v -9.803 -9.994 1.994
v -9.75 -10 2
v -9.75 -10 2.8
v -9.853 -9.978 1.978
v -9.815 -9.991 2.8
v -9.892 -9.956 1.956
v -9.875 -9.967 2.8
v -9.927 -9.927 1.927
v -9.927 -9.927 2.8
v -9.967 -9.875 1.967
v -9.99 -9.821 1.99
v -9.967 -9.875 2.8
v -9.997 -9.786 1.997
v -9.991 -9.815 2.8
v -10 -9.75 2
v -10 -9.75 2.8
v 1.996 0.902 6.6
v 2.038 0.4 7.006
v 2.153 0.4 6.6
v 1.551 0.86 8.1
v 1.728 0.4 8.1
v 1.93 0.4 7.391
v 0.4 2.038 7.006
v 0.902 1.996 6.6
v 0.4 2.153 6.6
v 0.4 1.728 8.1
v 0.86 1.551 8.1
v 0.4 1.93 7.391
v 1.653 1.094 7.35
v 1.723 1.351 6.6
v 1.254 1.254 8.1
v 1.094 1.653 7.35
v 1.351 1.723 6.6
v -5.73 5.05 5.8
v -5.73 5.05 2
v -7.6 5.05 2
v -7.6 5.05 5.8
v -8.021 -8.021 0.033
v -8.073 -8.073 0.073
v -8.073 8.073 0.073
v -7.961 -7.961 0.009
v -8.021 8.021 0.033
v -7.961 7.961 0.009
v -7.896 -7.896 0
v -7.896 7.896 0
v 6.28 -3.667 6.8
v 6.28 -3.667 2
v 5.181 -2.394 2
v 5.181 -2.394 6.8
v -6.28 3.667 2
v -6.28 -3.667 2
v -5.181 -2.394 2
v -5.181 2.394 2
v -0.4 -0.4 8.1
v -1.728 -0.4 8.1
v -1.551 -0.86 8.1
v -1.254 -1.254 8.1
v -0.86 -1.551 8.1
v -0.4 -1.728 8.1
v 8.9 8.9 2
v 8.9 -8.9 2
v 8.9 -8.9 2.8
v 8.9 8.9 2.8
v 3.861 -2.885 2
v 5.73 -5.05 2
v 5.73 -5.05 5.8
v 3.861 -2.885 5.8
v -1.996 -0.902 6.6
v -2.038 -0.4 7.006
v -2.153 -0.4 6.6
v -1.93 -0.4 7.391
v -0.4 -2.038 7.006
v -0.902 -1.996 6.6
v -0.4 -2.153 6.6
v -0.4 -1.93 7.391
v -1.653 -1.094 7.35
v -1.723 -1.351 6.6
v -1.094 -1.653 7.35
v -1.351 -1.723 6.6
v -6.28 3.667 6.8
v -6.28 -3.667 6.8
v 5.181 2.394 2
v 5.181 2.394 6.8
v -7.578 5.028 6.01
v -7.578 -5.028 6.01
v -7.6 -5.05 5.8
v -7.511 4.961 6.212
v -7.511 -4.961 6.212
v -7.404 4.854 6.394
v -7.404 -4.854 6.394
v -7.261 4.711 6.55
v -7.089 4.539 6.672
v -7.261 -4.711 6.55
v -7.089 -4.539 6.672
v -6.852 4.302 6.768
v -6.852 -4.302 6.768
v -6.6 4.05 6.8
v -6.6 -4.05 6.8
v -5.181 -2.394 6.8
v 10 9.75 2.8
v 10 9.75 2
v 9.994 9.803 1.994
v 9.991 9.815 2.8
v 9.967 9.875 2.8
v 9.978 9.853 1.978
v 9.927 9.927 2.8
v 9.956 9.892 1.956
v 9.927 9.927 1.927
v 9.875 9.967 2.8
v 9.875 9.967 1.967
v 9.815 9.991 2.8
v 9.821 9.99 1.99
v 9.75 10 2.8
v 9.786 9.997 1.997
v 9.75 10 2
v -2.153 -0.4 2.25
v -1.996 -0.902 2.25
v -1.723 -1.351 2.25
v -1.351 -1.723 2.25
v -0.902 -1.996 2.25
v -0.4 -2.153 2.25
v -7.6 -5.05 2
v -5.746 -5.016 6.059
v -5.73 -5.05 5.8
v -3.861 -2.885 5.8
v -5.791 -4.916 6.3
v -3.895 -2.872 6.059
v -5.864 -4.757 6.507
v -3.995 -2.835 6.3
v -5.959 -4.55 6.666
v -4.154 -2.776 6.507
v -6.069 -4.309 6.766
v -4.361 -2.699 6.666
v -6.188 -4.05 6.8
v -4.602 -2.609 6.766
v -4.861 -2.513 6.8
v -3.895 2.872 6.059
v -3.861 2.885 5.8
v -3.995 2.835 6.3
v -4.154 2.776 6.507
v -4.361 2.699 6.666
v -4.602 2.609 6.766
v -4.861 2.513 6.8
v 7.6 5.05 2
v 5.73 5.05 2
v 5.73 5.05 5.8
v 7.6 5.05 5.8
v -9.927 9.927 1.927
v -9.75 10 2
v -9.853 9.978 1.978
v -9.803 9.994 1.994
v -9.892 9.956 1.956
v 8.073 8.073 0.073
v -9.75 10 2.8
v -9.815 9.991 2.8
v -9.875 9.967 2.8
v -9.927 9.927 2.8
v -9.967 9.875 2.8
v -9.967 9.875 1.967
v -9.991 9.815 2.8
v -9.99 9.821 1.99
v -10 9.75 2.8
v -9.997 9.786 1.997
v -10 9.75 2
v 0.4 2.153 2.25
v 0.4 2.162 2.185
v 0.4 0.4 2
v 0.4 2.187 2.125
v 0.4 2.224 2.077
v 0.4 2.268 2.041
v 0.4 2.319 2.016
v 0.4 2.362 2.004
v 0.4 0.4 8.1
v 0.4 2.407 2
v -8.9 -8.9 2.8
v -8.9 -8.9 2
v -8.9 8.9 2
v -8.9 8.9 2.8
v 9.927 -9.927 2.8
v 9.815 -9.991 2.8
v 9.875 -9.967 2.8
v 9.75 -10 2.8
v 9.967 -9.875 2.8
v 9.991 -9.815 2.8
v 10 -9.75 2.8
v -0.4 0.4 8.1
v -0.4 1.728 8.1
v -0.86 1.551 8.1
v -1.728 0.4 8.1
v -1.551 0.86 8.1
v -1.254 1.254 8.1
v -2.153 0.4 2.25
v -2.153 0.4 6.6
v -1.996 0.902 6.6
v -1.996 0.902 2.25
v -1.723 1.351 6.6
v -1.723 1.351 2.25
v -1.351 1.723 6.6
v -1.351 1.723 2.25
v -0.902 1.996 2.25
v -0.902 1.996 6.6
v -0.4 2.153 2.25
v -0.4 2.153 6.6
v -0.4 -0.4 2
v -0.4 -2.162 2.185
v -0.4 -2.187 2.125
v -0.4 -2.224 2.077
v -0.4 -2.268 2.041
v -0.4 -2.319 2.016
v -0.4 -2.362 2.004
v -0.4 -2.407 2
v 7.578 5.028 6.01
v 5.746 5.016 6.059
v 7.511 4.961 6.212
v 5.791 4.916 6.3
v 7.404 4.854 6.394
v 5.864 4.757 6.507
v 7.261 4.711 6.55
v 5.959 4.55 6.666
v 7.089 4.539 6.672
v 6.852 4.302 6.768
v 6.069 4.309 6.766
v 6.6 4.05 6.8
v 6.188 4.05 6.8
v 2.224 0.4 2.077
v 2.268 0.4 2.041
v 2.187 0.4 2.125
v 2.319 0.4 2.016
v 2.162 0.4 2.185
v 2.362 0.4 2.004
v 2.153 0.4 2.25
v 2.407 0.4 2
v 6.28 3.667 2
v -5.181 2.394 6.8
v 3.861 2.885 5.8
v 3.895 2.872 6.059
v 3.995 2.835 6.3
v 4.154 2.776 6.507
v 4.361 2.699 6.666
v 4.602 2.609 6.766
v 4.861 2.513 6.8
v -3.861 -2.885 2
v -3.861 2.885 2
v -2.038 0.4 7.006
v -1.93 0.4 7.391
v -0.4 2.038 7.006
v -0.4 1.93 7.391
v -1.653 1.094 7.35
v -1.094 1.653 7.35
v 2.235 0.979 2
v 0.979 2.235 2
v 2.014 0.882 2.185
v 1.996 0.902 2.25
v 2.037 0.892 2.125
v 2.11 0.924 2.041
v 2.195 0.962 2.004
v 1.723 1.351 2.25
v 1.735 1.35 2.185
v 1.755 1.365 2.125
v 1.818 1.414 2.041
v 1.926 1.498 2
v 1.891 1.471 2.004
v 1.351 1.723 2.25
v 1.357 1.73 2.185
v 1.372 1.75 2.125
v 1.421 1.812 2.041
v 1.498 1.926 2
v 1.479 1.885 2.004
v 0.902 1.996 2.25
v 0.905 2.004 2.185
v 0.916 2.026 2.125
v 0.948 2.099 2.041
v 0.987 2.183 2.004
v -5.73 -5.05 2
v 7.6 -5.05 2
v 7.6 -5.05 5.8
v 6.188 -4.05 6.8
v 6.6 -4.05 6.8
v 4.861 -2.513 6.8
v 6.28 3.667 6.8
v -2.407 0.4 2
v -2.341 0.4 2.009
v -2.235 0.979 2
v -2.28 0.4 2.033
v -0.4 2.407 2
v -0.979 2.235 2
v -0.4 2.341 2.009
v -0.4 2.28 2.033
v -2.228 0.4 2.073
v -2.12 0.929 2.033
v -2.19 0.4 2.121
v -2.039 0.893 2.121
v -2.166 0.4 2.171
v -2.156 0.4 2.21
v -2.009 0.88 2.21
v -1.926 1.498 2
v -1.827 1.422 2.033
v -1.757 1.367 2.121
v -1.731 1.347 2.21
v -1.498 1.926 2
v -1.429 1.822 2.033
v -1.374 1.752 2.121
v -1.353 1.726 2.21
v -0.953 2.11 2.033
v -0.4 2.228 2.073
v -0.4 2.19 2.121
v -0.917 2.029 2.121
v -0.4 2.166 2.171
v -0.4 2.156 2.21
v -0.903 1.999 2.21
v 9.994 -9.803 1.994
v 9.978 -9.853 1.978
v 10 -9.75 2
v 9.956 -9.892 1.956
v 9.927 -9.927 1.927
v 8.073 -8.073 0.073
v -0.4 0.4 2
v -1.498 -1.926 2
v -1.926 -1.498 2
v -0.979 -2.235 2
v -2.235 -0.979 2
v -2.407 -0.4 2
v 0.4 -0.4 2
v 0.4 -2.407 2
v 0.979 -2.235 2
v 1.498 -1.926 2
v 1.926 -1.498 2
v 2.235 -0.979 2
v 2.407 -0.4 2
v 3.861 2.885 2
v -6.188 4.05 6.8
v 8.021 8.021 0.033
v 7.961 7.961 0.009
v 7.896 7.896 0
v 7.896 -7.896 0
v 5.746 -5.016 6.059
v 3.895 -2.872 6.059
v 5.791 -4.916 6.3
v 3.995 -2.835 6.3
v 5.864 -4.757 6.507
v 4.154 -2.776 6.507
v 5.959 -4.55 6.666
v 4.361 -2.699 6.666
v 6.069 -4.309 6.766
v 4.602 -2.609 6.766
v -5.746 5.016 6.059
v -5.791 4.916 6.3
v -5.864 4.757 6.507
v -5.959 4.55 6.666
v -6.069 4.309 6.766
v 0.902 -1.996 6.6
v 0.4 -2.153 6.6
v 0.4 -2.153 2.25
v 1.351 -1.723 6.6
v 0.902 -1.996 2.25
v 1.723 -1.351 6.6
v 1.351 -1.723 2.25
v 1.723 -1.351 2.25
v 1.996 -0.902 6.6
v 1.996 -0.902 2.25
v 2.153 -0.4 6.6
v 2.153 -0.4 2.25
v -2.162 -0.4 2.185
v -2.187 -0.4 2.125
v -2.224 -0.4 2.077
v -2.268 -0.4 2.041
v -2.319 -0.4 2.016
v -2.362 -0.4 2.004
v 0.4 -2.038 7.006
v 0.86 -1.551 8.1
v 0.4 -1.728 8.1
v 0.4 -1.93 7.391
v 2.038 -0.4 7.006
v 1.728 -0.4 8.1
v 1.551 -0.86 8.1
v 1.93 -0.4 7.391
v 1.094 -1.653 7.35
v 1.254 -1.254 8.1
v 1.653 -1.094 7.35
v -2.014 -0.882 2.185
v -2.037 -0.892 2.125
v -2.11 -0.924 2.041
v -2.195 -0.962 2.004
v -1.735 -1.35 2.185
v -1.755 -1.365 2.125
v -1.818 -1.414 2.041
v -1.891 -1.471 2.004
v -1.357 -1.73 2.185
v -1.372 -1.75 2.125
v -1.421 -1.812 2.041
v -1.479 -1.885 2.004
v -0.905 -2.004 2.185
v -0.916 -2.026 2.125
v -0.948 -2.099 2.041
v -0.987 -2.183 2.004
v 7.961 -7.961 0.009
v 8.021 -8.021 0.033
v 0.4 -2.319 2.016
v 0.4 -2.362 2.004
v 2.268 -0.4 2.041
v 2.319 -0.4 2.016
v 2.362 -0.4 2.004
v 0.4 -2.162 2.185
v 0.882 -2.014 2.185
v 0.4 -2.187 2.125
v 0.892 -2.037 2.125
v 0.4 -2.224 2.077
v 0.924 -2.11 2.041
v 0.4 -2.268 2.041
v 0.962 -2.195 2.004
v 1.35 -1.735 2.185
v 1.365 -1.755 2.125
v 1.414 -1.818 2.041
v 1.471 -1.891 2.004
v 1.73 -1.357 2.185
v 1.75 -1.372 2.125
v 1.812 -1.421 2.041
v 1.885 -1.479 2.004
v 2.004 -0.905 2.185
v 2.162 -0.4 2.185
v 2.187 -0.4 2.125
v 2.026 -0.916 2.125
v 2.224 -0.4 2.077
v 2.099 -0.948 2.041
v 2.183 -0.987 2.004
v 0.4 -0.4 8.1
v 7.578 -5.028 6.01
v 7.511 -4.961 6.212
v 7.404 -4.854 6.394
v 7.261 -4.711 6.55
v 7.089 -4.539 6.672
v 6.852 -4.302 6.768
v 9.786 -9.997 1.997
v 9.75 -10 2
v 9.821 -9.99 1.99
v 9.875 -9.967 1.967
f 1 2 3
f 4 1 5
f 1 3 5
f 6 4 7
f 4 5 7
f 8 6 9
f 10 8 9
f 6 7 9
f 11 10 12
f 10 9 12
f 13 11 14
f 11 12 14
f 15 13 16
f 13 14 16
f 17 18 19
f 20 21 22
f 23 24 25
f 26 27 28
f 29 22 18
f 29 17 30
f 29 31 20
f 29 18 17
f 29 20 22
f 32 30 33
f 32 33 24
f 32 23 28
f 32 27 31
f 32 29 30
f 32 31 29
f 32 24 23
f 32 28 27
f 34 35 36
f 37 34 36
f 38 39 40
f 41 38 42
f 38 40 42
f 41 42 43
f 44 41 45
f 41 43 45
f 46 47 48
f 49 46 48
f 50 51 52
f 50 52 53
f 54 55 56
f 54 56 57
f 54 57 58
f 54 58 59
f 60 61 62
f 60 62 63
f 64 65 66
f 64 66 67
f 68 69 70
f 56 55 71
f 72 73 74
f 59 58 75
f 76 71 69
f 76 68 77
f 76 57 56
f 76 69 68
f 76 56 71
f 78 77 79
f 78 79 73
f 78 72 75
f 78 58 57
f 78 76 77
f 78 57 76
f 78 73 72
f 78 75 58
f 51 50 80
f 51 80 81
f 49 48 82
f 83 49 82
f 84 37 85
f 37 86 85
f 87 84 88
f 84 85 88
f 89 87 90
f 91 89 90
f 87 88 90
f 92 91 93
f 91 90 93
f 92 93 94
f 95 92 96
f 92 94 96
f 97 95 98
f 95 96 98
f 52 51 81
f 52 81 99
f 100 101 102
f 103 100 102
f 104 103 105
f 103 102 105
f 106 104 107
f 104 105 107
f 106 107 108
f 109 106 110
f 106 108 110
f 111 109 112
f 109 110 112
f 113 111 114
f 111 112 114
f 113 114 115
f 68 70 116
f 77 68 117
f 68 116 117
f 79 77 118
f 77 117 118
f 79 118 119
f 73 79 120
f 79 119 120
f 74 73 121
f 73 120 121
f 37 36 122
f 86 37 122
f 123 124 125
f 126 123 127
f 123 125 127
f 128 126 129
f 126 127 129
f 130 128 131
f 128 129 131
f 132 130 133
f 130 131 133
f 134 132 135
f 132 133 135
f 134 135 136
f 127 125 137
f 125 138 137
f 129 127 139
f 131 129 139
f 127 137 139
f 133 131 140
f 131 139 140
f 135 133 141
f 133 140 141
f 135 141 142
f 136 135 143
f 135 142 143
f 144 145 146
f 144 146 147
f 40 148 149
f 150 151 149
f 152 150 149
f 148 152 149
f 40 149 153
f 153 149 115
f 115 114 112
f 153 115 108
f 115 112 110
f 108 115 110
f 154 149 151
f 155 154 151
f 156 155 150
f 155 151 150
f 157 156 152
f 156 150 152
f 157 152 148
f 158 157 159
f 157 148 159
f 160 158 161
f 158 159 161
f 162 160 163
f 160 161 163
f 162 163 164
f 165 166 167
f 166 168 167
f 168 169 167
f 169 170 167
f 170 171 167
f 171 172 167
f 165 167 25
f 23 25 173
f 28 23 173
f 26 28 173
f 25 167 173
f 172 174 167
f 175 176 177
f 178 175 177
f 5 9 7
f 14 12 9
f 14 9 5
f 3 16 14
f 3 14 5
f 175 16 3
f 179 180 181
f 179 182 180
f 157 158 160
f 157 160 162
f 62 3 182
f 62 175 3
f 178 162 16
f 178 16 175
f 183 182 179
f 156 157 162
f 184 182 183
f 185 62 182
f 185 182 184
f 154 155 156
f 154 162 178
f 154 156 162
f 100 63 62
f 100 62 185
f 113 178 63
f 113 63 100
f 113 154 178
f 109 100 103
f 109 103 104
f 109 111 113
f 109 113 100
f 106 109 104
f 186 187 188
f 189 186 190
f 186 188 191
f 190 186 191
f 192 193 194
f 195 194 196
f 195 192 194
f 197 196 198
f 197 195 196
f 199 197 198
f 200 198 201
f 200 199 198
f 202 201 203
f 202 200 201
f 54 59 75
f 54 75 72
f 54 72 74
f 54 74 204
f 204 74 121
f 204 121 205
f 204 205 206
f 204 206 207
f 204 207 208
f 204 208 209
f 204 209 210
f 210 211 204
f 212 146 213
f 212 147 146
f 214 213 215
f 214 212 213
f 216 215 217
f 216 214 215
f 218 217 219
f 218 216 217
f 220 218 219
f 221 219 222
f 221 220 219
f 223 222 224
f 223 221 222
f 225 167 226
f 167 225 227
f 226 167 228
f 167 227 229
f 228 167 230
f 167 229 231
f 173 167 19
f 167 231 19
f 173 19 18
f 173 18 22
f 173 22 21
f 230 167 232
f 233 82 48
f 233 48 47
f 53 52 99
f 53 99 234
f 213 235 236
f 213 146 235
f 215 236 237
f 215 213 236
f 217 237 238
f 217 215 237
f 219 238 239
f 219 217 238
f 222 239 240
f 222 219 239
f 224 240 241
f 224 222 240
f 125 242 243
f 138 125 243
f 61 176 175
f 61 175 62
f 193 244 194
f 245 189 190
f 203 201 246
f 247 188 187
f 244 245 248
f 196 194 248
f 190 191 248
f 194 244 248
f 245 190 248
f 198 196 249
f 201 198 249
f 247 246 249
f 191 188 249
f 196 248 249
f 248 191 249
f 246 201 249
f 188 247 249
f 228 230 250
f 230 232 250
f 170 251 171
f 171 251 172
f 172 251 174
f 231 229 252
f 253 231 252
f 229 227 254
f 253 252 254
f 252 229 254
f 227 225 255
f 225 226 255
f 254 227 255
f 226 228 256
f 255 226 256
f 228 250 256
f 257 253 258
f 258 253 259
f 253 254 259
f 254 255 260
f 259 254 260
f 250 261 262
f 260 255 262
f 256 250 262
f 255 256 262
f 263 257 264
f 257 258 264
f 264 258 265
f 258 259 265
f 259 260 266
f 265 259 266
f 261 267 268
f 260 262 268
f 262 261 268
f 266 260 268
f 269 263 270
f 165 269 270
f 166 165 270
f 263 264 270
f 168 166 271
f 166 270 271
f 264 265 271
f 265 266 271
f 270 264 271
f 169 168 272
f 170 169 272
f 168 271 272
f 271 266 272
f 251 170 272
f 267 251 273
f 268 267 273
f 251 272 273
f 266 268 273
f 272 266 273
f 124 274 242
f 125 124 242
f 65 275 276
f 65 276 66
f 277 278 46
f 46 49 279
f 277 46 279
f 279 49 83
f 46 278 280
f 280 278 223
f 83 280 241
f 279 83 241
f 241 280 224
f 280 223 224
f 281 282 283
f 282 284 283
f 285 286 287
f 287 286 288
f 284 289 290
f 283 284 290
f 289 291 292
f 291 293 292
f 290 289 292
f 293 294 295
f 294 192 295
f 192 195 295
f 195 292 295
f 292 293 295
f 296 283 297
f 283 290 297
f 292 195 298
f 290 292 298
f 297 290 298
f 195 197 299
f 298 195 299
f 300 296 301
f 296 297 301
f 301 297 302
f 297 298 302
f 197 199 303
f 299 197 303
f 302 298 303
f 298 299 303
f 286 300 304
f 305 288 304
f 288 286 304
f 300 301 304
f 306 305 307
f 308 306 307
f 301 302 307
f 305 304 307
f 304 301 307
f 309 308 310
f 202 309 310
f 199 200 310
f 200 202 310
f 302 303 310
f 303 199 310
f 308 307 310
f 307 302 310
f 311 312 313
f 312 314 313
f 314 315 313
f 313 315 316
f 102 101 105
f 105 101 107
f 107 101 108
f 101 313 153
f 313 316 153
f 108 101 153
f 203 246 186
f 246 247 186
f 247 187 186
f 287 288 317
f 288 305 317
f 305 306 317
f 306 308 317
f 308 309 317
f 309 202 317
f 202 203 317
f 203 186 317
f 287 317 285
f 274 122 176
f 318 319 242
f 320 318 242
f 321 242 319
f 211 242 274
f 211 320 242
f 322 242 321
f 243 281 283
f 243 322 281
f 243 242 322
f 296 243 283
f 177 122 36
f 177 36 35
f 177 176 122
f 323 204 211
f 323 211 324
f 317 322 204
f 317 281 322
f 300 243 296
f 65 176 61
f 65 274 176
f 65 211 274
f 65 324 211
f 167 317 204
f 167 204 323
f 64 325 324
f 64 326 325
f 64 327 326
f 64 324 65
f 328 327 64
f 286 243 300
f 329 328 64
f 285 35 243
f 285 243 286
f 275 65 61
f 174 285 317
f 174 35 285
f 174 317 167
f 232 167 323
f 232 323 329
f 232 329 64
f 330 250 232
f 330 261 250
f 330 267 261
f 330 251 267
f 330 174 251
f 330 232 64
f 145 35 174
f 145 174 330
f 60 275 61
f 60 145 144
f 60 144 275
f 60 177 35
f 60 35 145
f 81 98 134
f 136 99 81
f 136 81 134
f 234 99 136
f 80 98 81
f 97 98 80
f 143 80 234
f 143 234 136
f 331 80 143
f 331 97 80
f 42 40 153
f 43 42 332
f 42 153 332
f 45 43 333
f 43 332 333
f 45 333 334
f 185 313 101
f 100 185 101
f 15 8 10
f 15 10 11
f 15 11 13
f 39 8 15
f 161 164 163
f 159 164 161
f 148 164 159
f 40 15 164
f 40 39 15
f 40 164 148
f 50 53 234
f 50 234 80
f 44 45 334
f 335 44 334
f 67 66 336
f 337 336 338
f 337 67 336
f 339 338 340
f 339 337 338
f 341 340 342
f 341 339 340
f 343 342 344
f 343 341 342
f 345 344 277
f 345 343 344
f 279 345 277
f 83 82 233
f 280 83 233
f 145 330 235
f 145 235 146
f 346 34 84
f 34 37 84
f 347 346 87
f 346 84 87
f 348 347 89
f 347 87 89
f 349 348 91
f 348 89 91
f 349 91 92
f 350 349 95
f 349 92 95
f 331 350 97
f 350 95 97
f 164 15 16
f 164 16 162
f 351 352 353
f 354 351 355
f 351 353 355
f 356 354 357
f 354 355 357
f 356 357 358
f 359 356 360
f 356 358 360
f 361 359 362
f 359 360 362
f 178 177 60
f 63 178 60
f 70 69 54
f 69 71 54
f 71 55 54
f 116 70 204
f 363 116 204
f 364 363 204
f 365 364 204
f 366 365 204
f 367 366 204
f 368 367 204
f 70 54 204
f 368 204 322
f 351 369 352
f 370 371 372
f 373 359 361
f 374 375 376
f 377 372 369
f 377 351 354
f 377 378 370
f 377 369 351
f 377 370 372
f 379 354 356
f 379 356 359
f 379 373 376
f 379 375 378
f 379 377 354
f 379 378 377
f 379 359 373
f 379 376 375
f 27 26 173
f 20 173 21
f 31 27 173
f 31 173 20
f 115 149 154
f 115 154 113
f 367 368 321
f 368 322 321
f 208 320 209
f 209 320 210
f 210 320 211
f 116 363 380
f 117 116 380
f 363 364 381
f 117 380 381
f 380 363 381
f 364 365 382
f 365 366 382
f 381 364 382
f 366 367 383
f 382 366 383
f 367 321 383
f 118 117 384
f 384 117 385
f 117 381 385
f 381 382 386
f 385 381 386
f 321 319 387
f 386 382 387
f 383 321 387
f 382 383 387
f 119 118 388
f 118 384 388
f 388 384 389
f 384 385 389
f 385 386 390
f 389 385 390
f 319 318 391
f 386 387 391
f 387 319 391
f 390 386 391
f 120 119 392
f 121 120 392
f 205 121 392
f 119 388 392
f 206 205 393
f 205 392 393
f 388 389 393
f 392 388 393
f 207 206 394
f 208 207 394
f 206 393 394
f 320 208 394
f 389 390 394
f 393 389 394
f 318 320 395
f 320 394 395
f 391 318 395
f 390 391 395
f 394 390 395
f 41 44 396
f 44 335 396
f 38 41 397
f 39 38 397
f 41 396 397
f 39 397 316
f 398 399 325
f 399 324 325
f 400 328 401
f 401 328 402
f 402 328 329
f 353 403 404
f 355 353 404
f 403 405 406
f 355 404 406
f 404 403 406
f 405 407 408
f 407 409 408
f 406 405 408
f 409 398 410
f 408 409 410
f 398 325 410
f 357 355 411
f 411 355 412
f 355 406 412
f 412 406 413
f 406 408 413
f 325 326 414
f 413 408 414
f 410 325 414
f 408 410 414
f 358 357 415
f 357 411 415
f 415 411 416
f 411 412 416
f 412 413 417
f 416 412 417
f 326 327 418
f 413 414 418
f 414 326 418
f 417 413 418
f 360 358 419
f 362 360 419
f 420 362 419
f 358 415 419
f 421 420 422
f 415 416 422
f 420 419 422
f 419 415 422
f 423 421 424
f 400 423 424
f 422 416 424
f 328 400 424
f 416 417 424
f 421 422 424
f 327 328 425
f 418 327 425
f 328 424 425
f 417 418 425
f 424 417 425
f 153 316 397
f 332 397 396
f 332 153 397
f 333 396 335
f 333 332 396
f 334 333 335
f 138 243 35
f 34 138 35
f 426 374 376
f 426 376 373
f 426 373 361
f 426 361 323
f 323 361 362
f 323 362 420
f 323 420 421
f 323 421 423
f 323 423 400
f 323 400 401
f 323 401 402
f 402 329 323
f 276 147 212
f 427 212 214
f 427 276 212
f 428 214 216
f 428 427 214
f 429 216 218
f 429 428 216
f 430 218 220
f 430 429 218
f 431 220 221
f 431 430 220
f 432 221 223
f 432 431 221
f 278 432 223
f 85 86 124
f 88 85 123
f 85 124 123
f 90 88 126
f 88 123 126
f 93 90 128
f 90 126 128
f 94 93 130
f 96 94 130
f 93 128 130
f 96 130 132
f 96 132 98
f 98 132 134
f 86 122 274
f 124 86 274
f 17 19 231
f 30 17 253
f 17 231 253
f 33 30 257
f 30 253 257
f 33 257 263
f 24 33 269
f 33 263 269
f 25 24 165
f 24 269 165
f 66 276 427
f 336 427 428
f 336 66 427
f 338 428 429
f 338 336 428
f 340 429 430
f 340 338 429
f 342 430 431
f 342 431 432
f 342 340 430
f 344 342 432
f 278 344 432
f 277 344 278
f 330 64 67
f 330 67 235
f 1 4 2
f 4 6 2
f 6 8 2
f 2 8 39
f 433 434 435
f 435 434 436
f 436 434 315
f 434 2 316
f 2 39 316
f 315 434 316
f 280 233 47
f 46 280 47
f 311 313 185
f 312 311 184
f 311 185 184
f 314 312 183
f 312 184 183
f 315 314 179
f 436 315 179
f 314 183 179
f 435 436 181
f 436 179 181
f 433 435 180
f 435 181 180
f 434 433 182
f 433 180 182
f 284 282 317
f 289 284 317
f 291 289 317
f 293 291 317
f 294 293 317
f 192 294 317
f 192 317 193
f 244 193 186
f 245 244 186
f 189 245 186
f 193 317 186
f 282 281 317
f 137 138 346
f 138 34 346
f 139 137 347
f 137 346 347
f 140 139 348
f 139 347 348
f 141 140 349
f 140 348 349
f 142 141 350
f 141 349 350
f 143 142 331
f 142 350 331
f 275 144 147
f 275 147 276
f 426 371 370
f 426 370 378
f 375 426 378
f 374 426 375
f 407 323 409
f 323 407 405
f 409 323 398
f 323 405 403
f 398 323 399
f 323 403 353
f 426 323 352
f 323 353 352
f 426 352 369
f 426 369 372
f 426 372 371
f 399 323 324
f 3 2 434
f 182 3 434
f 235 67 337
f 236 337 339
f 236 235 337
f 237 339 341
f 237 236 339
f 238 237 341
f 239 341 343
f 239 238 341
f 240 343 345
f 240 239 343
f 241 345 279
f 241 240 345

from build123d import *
from OCP.BRepFilletAPI import BRepFilletAPI_MakeChamfer

# Parameters (mm, degrees)
SKETCH3_W           = 20
SKETCH3_H           = 20
BOSS_EXTRUDE1_DEPTH = 2
SKETCH4_W           = 20
SKETCH4_H           = 20
SKETCH4_W_2         = 17.8
SKETCH4_H_2         = 17.8
BOSS_EXTRUDE2_DEPTH = 0.8
CHAMFER1_SIZE       = 2
BOSS_EXTRUDE3_DEPTH = 4.8
FILLET2_R           = 1
FILLET4_R           = 1
BOSS_EXTRUDE4_DEPTH = 6.1
CHAMFER2_SIZE       = 1.5
CHAMFER2_SIZE2      = 0.415986816
FILLET5_R           = 0.25
FILLET6_R           = 0.25


with BuildPart() as part:
    # Sketch3 → Boss-Extrude1 (new body)
    with BuildSketch(Plane.XY):
        Rectangle(SKETCH3_W, SKETCH3_H)
    extrude(amount=BOSS_EXTRUDE1_DEPTH)

    # Sketch4 → Boss-Extrude2 (add)
    with BuildSketch(Plane.XY.offset(2)):
        Rectangle(SKETCH4_W, SKETCH4_H)
        Rectangle(SKETCH4_W_2, SKETCH4_H_2, mode=Mode.SUBTRACT)
    extrude(amount=BOSS_EXTRUDE2_DEPTH)

    # Chamfer1
    chamfer1_edges = [part.edges().sort_by_distance(p)[0] for p in [
        (0, 10, 0),
        (10, 0, 0),
        (0, -10, 0),
        (-10, 0, 0),
    ]]
    chamfer(chamfer1_edges, length=CHAMFER1_SIZE)

    # Sketch7 → Boss-Extrude3 (add)
    with BuildSketch(Plane.XY.offset(2)):
        Polygon((-7.6, 5.05), (-7.6, -5.05), (-5.73, -5.05), (-3.861210285, -2.885), (-3.861210285, 2.885), (-5.73, 5.05), align=None)
        Polygon((-5.181210285, -2.394094045), (-5.181210285, 2.394094045), (-6.28, 3.667046113), (-6.28, -3.667046113), align=None, mode=Mode.SUBTRACT)
    boss_extrude3 = extrude(amount=BOSS_EXTRUDE3_DEPTH)

    # Mirror1: Boss-Extrude3 across plane
    add(boss_extrude3.mirror(Plane(origin=(0, 0, 0), x_dir=(0, 0, 1), z_dir=(1, 0, 0))))

    # Fillet2
    fillet2_edges = [part.edges().sort_by_distance(p)[0] for p in [
        (-6.665, 5.05, 6.8),
        (-7.6, 0, 6.8),
        (-6.665, -5.05, 6.8),
        (-4.795605142, -3.9675, 6.8),
        (-3.861210285, 0, 6.8),
        (-4.795605142, 3.9675, 6.8),
    ]]
    fillet(fillet2_edges, radius=FILLET2_R)

    # Fillet4
    fillet4_edges = [part.edges().sort_by_distance(p)[0] for p in [
        (6.665, 5.05, 6.8),
        (4.795605142, 3.9675, 6.8),
        (3.861210285, 0, 6.8),
        (4.795605142, -3.9675, 6.8),
        (6.665, -5.05, 6.8),
        (7.6, 0, 6.8),
    ]]
    fillet(fillet4_edges, radius=FILLET4_R)

    # Sketch8 → Boss-Extrude4 (add)
    with BuildSketch(Plane.XY.offset(2)):
        with BuildLine():
            Line((-0.4, 2.153160468), (-0.4, 0.4))
            Line((-0.4, 0.4), (-2.153160468, 0.4))
            ThreePointArc((-2.153160468, 0.4), (-1.548563851, 1.548563851), (-0.4, 2.153160468))
        make_face()
        with BuildLine():
            Line((0.4, 2.153160468), (0.4, 0.4))
            Line((0.4, 0.4), (2.153160468, 0.4))
            ThreePointArc((2.153160468, 0.4), (1.548563851, 1.548563851), (0.4, 2.153160468))
        make_face()
        with BuildLine():
            Line((2.153160468, -0.4), (0.4, -0.4))
            Line((0.4, -0.4), (0.4, -2.153160468))
            ThreePointArc((0.4, -2.153160468), (1.548563851, -1.548563851), (2.153160468, -0.4))
        make_face()
        with BuildLine():
            Line((-0.4, -0.4), (-2.153160468, -0.4))
            ThreePointArc((-2.153160468, -0.4), (-1.548563851, -1.548563851), (-0.4, -2.153160468))
            Line((-0.4, -2.153160468), (-0.4, -0.4))
        make_face()
    extrude(amount=BOSS_EXTRUDE4_DEPTH)

    # Chamfer2: one chamfer whose edges measure the first distance from different faces: ONE call of the kernel's chamfer builder (chamfer() names one face for all edges)
    chamfer2_edges_1 = [part.edges().sort_by_distance(p)[0] for p in [
        (1.548563851, 1.548563851, 8.1),
    ]]
    chamfer2_side_1 = [part.faces().sort_by_distance(p)[0] for p in [
        (1.548563851, 1.548563851, 5.05),
    ]]
    chamfer2_edges_2 = [part.edges().sort_by_distance(p)[0] for p in [
        (-1.548563851, 1.548563851, 8.1),
    ]]
    chamfer2_side_2 = [part.faces().sort_by_distance(p)[0] for p in [
        (-1.548563851, 1.548563851, 5.05),
    ]]
    chamfer2_edges_3 = [part.edges().sort_by_distance(p)[0] for p in [
        (1.548563851, -1.548563851, 8.1),
    ]]
    chamfer2_side_3 = [part.faces().sort_by_distance(p)[0] for p in [
        (1.548563851, -1.548563851, 5.05),
    ]]
    chamfer2_edges_4 = [part.edges().sort_by_distance(p)[0] for p in [
        (-1.548563851, -1.548563851, 8.1),
    ]]
    chamfer2_side_4 = [part.faces().sort_by_distance(p)[0] for p in [
        (-1.548563851, -1.548563851, 5.05),
    ]]
    chamfer2 = BRepFilletAPI_MakeChamfer(part.part.solid().wrapped)
    for e in chamfer2_edges_1:
        chamfer2.Add(CHAMFER2_SIZE, CHAMFER2_SIZE2, e.wrapped, chamfer2_side_1[0].wrapped)  # the first distance lies on this face
    for e in chamfer2_edges_2:
        chamfer2.Add(CHAMFER2_SIZE, CHAMFER2_SIZE2, e.wrapped, chamfer2_side_2[0].wrapped)  # the first distance lies on this face
    for e in chamfer2_edges_3:
        chamfer2.Add(CHAMFER2_SIZE, CHAMFER2_SIZE2, e.wrapped, chamfer2_side_3[0].wrapped)  # the first distance lies on this face
    for e in chamfer2_edges_4:
        chamfer2.Add(CHAMFER2_SIZE, CHAMFER2_SIZE2, e.wrapped, chamfer2_side_4[0].wrapped)  # the first distance lies on this face
    add(Compound.cast(chamfer2.Shape()), mode=Mode.REPLACE)

    # Fillet5
    # the kernel refuses this fillet: 0.25 mm, written as the material it adds along each edge
    with BuildSketch(Plane(origin=(0, 0, 2), x_dir=(0.9948253006506458, -0.10160030110857103, 0), z_dir=(-0.10160030110857103, -0.9948253006506458, 0))) as fillet5_piece_1_section:
        with BuildLine():
            CenterArc((2.19 + FILLET5_R, FILLET5_R), FILLET5_R, 180, 90)
            Line((2.19, FILLET5_R), (2.19, 0))
            Line((2.19, 0), (2.19 + FILLET5_R, 0))
        make_face()
    fillet5_piece_1 = revolve(axis=Axis((0, 0, 2), (0, 0, 1)), revolution_arc=101.662660771, mode=Mode.PRIVATE)
    fillet5_piece_1 = split(fillet5_piece_1, bisect_by=Plane(origin=(0.4, 1.598681541, 2.070877118), z_dir=(1, 0, 0)), keep=Keep.TOP, mode=Mode.PRIVATE)
    fillet5_piece_1 = split(fillet5_piece_1, bisect_by=Plane(origin=(1.598681541, 0.4, 2.070877118), z_dir=(0, 1, 0)), keep=Keep.TOP, mode=Mode.PRIVATE)
    add(fillet5_piece_1)
    with BuildSketch(Plane(origin=(0, 0, 2), x_dir=(-0.9948253006506458, -0.10160030110857048, 0), z_dir=(0.10160030110857048, -0.9948253006506458, 0))) as fillet5_piece_2_section:
        with BuildLine():
            CenterArc((2.19 + FILLET5_R, -FILLET5_R), FILLET5_R, 90, 90)
            Line((2.19, -FILLET5_R), (2.19, 0))
            Line((2.19, 0), (2.19 + FILLET5_R, 0))
        make_face()
    fillet5_piece_2 = revolve(axis=Axis((0, 0, 2), (0, 0, -1)), revolution_arc=101.662660771, mode=Mode.PRIVATE)
    fillet5_piece_2 = split(fillet5_piece_2, bisect_by=Plane(origin=(-1.598681541, 0.4, 2.070877118), z_dir=(0, 1, 0)), keep=Keep.TOP, mode=Mode.PRIVATE)
    fillet5_piece_2 = split(fillet5_piece_2, bisect_by=Plane(origin=(-0.4, 1.598681541, 2.070877118), z_dir=(-1, 0, 0)), keep=Keep.TOP, mode=Mode.PRIVATE)
    add(fillet5_piece_2)
    with BuildSketch(Plane(origin=(0, 0, 2), x_dir=(-0.1016003011085696, -0.9948253006506458, 0), z_dir=(-0.9948253006506458, 0.1016003011085696, 0))) as fillet5_piece_3_section:
        with BuildLine():
            CenterArc((2.19 + FILLET5_R, FILLET5_R), FILLET5_R, 180, 90)
            Line((2.19, FILLET5_R), (2.19, 0))
            Line((2.19, 0), (2.19 + FILLET5_R, 0))
        make_face()
    fillet5_piece_3 = revolve(axis=Axis((0, 0, 2), (0, 0, 1)), revolution_arc=101.662660771, mode=Mode.PRIVATE)
    fillet5_piece_3 = split(fillet5_piece_3, bisect_by=Plane(origin=(1.598681541, -0.4, 2.070877118), z_dir=(0, -1, 0)), keep=Keep.TOP, mode=Mode.PRIVATE)
    fillet5_piece_3 = split(fillet5_piece_3, bisect_by=Plane(origin=(0.4, -1.598681541, 2.070877118), z_dir=(1, 0, 0)), keep=Keep.TOP, mode=Mode.PRIVATE)
    add(fillet5_piece_3)
    with BuildSketch(Plane(origin=(0, 0, 2), x_dir=(-0.994825300650646, 0.10160030110856982, 0), z_dir=(0.10160030110856982, 0.994825300650646, 0))) as fillet5_piece_4_section:
        with BuildLine():
            CenterArc((2.19 + FILLET5_R, FILLET5_R), FILLET5_R, 180, 90)
            Line((2.19 + FILLET5_R, 0), (2.19, 0))
            Line((2.19, 0), (2.19, FILLET5_R))
        make_face()
    fillet5_piece_4 = revolve(axis=Axis((0, 0, 2), (0, 0, 1)), revolution_arc=101.662660771, mode=Mode.PRIVATE)
    fillet5_piece_4 = split(fillet5_piece_4, bisect_by=Plane(origin=(-0.4, -1.598681541, 2.070877118), z_dir=(-1, 0, 0)), keep=Keep.TOP, mode=Mode.PRIVATE)
    fillet5_piece_4 = split(fillet5_piece_4, bisect_by=Plane(origin=(-1.598681541, -0.4, 2.070877118), z_dir=(0, -1, 0)), keep=Keep.TOP, mode=Mode.PRIVATE)
    add(fillet5_piece_4)

    # Fillet6
    fillet6_edges = [part.edges().sort_by_distance(p)[0] for p in [
        (8, 0, 0),
        (0, 8, 0),
        (0, -8, 0),
        (-8, 0, 0),
        (-10, 10, 2.4),
        (10, 10, 2.4),
        (10, -10, 2.4),
        (-10, -10, 2.4),
    ]]
    fillet(fillet6_edges, radius=FILLET6_R)


solid = part.part
